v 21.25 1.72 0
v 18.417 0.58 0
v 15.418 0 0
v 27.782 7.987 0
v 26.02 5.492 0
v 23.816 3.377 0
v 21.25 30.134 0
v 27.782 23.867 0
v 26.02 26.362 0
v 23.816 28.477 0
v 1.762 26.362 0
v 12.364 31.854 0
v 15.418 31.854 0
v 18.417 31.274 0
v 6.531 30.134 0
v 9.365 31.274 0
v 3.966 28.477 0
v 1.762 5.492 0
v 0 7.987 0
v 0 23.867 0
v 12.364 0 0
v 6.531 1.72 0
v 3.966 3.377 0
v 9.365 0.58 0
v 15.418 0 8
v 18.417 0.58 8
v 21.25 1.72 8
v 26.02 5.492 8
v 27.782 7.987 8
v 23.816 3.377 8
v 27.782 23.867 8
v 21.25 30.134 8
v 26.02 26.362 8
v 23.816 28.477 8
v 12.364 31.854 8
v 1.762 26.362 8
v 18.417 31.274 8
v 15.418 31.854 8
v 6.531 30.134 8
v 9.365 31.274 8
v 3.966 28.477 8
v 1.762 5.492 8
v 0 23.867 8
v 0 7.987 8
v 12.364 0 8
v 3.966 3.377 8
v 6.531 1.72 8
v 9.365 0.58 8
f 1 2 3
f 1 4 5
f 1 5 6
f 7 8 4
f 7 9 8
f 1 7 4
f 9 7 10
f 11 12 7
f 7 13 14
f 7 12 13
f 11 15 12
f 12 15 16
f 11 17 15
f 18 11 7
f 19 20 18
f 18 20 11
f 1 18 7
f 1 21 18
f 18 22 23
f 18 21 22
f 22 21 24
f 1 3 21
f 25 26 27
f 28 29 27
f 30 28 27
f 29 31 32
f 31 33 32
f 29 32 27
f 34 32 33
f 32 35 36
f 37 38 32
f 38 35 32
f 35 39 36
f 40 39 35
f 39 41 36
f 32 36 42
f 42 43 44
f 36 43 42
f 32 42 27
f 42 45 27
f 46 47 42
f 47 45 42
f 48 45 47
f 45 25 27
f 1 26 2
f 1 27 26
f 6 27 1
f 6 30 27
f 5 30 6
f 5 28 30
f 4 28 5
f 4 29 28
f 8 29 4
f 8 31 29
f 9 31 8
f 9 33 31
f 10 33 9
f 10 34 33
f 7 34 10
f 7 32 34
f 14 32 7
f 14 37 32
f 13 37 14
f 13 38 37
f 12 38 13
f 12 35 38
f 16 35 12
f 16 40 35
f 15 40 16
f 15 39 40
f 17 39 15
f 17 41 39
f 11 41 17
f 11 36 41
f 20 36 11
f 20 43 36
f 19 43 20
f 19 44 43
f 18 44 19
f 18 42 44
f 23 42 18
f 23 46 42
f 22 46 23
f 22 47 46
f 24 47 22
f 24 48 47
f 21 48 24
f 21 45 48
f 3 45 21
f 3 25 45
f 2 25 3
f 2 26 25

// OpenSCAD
$fn = 32;

// ----------------------------------------------------------------------
// Flat adaptor: double_d, 8 mm thick
// ----------------------------------------------------------------------

// --- parameters (mm) ---
profile_height = 8;       // extrusion height
profile_points = 24;      // points of the closed outline

profile = [[27.782, 23.867], [26.02, 26.362], [23.816, 28.477], [21.25, 30.134], [18.417, 31.274], [15.418, 31.854], [12.364, 31.854], [9.365, 31.274], [6.531, 30.134], [3.966, 28.477], [1.762, 26.362], [0, 23.867], [0, 7.987], [1.762, 5.492], [3.966, 3.377], [6.531, 1.72], [9.365, 0.58], [12.364, 0], [15.418, 0], [18.417, 0.58], [21.25, 1.72], [23.816, 3.377], [26.02, 5.492], [27.782, 7.987]];  // single closed polygon, 24 points, counter clockwise

// --- the one profile operation ---
linear_extrude(height = profile_height) polygon(points = profile);
